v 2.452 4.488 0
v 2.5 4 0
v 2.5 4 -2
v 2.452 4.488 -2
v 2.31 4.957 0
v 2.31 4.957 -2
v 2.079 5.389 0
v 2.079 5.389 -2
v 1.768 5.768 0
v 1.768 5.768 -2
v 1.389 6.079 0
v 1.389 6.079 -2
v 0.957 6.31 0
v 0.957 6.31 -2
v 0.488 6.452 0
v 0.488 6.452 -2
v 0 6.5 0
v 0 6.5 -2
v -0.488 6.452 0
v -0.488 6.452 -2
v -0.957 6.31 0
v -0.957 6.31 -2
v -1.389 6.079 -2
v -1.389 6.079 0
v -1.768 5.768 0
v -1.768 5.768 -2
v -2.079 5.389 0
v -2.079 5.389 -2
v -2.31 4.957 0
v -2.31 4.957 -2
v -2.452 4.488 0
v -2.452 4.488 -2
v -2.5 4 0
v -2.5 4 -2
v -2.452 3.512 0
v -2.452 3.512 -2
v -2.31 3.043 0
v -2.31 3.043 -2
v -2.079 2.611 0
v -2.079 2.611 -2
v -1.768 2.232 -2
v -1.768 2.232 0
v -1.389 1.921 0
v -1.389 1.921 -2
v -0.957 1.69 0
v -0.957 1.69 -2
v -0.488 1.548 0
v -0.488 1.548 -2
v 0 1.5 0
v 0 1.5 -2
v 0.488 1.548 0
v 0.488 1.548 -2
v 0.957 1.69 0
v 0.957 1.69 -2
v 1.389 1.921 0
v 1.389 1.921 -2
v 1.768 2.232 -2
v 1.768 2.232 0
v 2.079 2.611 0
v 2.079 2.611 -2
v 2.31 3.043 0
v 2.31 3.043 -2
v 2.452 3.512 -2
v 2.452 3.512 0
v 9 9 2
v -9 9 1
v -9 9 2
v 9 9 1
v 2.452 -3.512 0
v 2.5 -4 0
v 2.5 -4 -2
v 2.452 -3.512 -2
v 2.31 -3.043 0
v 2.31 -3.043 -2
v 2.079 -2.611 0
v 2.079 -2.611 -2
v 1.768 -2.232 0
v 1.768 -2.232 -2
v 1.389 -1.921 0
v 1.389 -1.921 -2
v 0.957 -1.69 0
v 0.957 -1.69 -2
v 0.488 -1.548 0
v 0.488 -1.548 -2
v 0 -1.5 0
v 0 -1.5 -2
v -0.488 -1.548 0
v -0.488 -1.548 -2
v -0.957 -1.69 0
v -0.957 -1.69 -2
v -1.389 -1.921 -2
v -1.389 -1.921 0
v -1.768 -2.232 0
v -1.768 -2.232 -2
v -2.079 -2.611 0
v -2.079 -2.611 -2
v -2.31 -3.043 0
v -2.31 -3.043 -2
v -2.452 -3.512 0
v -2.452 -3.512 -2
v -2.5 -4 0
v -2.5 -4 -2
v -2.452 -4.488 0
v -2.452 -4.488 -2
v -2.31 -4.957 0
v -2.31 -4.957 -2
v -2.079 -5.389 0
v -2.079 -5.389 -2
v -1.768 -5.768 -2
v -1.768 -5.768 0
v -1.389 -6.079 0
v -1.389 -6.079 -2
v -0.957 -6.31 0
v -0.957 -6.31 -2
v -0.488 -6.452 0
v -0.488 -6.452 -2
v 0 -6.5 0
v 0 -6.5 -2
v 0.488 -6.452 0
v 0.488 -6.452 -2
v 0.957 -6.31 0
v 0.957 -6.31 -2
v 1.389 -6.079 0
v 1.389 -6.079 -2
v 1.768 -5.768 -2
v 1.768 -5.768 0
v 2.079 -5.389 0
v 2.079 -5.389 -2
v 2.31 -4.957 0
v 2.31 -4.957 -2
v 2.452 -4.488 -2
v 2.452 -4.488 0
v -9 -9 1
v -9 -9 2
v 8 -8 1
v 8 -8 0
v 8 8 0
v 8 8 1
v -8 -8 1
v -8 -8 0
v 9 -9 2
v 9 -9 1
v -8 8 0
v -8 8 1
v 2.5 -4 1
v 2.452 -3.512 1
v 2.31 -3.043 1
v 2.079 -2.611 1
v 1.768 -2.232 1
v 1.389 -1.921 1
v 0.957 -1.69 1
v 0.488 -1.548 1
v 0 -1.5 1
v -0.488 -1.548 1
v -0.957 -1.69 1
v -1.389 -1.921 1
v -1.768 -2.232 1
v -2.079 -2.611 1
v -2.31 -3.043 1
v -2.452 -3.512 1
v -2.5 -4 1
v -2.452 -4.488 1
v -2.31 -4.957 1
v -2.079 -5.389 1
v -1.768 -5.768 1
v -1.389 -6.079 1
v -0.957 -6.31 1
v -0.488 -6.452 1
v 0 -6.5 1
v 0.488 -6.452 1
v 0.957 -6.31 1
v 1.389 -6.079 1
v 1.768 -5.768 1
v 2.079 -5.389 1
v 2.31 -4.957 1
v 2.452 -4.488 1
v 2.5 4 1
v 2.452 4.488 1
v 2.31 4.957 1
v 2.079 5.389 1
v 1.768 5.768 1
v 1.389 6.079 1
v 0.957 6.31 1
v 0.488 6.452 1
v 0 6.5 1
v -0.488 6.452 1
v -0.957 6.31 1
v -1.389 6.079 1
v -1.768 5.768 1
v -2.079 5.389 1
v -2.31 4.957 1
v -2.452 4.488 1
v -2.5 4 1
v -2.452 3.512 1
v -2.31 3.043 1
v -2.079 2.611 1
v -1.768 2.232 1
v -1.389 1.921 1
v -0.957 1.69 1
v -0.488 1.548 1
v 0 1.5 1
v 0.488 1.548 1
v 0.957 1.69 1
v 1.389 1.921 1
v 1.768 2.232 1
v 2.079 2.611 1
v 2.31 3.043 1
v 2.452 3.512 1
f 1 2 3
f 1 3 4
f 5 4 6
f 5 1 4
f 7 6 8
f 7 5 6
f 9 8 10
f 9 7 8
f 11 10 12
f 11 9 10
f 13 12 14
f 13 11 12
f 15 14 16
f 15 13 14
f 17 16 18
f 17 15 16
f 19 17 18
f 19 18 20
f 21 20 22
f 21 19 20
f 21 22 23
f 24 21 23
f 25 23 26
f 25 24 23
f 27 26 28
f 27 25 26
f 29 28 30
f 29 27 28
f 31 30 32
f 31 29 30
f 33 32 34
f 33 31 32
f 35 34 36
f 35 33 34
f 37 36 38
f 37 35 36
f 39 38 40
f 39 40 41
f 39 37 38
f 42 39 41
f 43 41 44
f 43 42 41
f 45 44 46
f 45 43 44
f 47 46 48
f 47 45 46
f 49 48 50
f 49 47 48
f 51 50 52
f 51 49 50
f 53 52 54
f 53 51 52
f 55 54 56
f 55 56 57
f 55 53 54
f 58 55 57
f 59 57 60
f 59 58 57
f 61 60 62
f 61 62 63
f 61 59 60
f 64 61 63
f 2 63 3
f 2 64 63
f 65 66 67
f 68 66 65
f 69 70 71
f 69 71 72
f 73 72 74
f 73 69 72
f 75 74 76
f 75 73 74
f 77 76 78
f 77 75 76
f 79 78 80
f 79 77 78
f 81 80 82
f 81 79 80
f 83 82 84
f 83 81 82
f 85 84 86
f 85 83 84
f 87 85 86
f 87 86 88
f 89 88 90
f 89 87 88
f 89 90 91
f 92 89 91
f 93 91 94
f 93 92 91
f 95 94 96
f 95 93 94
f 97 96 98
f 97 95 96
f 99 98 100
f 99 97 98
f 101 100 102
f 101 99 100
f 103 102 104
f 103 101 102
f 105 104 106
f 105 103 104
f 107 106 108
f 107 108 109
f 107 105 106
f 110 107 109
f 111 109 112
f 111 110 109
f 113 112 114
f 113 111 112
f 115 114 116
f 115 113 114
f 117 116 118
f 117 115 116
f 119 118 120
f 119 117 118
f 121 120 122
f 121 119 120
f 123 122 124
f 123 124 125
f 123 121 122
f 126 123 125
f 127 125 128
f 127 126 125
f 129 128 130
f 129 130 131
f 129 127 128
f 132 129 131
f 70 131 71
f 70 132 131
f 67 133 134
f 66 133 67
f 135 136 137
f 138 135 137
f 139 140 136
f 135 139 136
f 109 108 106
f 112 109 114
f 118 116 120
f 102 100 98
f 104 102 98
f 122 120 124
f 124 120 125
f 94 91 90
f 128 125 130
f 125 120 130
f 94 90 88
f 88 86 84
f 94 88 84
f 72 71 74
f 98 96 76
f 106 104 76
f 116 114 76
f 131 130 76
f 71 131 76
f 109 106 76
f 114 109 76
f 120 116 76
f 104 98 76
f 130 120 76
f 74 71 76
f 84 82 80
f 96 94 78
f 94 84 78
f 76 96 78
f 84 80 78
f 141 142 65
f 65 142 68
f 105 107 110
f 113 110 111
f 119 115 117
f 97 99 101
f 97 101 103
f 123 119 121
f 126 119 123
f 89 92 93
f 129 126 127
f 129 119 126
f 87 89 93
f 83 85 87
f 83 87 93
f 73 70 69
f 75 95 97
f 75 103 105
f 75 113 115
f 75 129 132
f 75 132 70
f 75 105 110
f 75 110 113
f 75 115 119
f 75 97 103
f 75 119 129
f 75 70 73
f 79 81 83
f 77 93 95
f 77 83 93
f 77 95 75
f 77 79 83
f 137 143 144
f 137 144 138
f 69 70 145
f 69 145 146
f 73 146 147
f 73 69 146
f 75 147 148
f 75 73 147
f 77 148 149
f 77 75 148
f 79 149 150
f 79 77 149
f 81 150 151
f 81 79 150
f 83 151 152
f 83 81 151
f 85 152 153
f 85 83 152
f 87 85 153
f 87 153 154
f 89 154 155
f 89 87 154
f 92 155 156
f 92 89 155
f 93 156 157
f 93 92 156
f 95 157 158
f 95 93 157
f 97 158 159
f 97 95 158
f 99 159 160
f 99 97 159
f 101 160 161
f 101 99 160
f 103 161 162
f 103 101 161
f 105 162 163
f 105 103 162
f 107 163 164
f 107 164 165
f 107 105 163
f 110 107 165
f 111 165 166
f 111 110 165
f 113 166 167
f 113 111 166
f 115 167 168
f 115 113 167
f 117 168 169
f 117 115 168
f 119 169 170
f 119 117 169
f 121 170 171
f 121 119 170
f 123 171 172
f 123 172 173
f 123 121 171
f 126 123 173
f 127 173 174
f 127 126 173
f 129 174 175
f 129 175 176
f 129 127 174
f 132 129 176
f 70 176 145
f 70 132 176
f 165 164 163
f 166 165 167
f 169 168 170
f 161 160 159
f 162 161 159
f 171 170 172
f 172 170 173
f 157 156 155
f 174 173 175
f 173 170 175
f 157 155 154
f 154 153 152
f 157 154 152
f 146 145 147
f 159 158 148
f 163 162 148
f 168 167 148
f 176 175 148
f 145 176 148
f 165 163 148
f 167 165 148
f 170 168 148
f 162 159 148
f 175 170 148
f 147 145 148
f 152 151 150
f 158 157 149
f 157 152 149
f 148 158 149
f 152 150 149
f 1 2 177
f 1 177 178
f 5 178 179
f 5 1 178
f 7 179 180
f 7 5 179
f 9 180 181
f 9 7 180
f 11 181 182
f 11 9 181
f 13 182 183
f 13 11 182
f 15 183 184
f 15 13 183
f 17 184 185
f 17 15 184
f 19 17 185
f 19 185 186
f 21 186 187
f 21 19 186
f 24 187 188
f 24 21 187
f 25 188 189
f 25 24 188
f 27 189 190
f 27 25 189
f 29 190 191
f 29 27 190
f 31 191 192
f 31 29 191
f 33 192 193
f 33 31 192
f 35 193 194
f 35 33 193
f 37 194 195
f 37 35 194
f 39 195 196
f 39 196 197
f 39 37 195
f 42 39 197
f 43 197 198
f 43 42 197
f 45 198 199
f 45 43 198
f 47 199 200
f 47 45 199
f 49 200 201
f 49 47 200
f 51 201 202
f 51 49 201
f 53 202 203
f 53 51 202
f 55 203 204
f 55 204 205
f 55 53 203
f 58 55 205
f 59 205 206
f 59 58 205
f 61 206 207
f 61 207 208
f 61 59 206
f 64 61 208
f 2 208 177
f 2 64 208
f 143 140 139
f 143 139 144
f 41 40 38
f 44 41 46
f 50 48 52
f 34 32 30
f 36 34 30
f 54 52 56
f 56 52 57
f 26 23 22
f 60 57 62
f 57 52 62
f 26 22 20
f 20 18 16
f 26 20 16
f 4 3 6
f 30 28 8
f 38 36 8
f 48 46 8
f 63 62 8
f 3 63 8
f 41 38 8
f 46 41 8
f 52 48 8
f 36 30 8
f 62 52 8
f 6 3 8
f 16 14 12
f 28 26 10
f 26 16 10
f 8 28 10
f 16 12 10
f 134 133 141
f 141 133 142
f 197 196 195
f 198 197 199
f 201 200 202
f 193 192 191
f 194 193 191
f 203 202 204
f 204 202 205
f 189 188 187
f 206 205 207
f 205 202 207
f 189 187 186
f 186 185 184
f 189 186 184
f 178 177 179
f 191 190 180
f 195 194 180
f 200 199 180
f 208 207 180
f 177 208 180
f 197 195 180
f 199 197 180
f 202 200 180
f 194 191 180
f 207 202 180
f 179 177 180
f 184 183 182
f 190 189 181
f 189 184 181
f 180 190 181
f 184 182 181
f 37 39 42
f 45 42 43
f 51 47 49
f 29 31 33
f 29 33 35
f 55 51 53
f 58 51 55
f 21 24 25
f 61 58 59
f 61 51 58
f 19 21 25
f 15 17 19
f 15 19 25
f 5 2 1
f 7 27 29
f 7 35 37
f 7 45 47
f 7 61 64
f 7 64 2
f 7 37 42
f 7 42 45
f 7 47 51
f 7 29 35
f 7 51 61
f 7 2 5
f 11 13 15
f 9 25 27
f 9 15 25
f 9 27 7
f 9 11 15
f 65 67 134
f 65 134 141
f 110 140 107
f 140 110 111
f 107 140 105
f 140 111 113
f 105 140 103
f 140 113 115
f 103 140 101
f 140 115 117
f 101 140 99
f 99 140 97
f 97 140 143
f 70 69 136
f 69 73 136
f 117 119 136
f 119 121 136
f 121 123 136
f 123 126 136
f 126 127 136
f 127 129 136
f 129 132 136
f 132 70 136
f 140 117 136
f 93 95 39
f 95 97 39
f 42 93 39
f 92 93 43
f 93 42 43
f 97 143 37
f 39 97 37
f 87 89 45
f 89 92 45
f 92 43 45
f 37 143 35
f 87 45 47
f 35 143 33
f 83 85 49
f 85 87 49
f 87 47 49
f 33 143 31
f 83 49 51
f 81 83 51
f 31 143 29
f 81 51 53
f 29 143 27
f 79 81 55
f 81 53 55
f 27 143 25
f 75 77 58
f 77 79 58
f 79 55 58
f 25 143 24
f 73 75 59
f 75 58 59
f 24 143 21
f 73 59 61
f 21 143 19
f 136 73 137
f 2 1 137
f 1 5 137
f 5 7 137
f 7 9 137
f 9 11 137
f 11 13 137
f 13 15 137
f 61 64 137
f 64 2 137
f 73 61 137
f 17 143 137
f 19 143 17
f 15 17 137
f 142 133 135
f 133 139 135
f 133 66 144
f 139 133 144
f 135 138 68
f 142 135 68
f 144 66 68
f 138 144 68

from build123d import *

# Parameters (mm, degrees)
F0_W     = 18
F0_H     = 18
F0_W_2   = 16
F0_H_2   = 16
F0_R     = 2.5
F1_DEPTH = 2
F2_DEPTH = 1
F3_DEPTH = 1
F4_DEPTH = 2


with BuildPart() as f1:
    # F0 (on Top) → F1 (new body)
    with BuildSketch(Plane.XY):
        Rectangle(F0_W, F0_H)
        Rectangle(F0_W_2, F0_H_2, mode=Mode.SUBTRACT)
        Rectangle(F0_W_2, F0_H_2)
        with Locations((0, -4)):
            Circle(F0_R, mode=Mode.SUBTRACT)
        with Locations((0, 4)):
            Circle(F0_R, mode=Mode.SUBTRACT)
        with Locations((0, 4)):
            Circle(F0_R)
        with Locations((0, -4)):
            Circle(F0_R)
    extrude(amount=F1_DEPTH)

    # F0 (on Top) → F2 (cut)
    with BuildSketch(Plane.XY):
        Rectangle(F0_W, F0_H)
        Rectangle(F0_W_2, F0_H_2, mode=Mode.SUBTRACT)
    extrude(amount=F2_DEPTH, mode=Mode.SUBTRACT)

    # F0 (on Top) → F3 (cut)
    with BuildSketch(Plane.XY):
        with Locations((0, -4)):
            Circle(F0_R)
        with Locations((0, 4)):
            Circle(F0_R)
    extrude(amount=F3_DEPTH, mode=Mode.SUBTRACT)


with BuildPart() as f4:
    # F0 (on Top) → F4 (new body)
    with BuildSketch(Plane.XY):
        with Locations((0, -4)):
            Circle(F0_R)
    extrude(amount=-F4_DEPTH)


with BuildPart() as f4b:
    # F0 (on Top) → F4, piece 2 (new body)
    with BuildSketch(Plane.XY):
        with Locations((0, 4)):
            Circle(F0_R)
    extrude(amount=-F4_DEPTH)


solid = Compound([f1.part, f4.part, f4b.part])
